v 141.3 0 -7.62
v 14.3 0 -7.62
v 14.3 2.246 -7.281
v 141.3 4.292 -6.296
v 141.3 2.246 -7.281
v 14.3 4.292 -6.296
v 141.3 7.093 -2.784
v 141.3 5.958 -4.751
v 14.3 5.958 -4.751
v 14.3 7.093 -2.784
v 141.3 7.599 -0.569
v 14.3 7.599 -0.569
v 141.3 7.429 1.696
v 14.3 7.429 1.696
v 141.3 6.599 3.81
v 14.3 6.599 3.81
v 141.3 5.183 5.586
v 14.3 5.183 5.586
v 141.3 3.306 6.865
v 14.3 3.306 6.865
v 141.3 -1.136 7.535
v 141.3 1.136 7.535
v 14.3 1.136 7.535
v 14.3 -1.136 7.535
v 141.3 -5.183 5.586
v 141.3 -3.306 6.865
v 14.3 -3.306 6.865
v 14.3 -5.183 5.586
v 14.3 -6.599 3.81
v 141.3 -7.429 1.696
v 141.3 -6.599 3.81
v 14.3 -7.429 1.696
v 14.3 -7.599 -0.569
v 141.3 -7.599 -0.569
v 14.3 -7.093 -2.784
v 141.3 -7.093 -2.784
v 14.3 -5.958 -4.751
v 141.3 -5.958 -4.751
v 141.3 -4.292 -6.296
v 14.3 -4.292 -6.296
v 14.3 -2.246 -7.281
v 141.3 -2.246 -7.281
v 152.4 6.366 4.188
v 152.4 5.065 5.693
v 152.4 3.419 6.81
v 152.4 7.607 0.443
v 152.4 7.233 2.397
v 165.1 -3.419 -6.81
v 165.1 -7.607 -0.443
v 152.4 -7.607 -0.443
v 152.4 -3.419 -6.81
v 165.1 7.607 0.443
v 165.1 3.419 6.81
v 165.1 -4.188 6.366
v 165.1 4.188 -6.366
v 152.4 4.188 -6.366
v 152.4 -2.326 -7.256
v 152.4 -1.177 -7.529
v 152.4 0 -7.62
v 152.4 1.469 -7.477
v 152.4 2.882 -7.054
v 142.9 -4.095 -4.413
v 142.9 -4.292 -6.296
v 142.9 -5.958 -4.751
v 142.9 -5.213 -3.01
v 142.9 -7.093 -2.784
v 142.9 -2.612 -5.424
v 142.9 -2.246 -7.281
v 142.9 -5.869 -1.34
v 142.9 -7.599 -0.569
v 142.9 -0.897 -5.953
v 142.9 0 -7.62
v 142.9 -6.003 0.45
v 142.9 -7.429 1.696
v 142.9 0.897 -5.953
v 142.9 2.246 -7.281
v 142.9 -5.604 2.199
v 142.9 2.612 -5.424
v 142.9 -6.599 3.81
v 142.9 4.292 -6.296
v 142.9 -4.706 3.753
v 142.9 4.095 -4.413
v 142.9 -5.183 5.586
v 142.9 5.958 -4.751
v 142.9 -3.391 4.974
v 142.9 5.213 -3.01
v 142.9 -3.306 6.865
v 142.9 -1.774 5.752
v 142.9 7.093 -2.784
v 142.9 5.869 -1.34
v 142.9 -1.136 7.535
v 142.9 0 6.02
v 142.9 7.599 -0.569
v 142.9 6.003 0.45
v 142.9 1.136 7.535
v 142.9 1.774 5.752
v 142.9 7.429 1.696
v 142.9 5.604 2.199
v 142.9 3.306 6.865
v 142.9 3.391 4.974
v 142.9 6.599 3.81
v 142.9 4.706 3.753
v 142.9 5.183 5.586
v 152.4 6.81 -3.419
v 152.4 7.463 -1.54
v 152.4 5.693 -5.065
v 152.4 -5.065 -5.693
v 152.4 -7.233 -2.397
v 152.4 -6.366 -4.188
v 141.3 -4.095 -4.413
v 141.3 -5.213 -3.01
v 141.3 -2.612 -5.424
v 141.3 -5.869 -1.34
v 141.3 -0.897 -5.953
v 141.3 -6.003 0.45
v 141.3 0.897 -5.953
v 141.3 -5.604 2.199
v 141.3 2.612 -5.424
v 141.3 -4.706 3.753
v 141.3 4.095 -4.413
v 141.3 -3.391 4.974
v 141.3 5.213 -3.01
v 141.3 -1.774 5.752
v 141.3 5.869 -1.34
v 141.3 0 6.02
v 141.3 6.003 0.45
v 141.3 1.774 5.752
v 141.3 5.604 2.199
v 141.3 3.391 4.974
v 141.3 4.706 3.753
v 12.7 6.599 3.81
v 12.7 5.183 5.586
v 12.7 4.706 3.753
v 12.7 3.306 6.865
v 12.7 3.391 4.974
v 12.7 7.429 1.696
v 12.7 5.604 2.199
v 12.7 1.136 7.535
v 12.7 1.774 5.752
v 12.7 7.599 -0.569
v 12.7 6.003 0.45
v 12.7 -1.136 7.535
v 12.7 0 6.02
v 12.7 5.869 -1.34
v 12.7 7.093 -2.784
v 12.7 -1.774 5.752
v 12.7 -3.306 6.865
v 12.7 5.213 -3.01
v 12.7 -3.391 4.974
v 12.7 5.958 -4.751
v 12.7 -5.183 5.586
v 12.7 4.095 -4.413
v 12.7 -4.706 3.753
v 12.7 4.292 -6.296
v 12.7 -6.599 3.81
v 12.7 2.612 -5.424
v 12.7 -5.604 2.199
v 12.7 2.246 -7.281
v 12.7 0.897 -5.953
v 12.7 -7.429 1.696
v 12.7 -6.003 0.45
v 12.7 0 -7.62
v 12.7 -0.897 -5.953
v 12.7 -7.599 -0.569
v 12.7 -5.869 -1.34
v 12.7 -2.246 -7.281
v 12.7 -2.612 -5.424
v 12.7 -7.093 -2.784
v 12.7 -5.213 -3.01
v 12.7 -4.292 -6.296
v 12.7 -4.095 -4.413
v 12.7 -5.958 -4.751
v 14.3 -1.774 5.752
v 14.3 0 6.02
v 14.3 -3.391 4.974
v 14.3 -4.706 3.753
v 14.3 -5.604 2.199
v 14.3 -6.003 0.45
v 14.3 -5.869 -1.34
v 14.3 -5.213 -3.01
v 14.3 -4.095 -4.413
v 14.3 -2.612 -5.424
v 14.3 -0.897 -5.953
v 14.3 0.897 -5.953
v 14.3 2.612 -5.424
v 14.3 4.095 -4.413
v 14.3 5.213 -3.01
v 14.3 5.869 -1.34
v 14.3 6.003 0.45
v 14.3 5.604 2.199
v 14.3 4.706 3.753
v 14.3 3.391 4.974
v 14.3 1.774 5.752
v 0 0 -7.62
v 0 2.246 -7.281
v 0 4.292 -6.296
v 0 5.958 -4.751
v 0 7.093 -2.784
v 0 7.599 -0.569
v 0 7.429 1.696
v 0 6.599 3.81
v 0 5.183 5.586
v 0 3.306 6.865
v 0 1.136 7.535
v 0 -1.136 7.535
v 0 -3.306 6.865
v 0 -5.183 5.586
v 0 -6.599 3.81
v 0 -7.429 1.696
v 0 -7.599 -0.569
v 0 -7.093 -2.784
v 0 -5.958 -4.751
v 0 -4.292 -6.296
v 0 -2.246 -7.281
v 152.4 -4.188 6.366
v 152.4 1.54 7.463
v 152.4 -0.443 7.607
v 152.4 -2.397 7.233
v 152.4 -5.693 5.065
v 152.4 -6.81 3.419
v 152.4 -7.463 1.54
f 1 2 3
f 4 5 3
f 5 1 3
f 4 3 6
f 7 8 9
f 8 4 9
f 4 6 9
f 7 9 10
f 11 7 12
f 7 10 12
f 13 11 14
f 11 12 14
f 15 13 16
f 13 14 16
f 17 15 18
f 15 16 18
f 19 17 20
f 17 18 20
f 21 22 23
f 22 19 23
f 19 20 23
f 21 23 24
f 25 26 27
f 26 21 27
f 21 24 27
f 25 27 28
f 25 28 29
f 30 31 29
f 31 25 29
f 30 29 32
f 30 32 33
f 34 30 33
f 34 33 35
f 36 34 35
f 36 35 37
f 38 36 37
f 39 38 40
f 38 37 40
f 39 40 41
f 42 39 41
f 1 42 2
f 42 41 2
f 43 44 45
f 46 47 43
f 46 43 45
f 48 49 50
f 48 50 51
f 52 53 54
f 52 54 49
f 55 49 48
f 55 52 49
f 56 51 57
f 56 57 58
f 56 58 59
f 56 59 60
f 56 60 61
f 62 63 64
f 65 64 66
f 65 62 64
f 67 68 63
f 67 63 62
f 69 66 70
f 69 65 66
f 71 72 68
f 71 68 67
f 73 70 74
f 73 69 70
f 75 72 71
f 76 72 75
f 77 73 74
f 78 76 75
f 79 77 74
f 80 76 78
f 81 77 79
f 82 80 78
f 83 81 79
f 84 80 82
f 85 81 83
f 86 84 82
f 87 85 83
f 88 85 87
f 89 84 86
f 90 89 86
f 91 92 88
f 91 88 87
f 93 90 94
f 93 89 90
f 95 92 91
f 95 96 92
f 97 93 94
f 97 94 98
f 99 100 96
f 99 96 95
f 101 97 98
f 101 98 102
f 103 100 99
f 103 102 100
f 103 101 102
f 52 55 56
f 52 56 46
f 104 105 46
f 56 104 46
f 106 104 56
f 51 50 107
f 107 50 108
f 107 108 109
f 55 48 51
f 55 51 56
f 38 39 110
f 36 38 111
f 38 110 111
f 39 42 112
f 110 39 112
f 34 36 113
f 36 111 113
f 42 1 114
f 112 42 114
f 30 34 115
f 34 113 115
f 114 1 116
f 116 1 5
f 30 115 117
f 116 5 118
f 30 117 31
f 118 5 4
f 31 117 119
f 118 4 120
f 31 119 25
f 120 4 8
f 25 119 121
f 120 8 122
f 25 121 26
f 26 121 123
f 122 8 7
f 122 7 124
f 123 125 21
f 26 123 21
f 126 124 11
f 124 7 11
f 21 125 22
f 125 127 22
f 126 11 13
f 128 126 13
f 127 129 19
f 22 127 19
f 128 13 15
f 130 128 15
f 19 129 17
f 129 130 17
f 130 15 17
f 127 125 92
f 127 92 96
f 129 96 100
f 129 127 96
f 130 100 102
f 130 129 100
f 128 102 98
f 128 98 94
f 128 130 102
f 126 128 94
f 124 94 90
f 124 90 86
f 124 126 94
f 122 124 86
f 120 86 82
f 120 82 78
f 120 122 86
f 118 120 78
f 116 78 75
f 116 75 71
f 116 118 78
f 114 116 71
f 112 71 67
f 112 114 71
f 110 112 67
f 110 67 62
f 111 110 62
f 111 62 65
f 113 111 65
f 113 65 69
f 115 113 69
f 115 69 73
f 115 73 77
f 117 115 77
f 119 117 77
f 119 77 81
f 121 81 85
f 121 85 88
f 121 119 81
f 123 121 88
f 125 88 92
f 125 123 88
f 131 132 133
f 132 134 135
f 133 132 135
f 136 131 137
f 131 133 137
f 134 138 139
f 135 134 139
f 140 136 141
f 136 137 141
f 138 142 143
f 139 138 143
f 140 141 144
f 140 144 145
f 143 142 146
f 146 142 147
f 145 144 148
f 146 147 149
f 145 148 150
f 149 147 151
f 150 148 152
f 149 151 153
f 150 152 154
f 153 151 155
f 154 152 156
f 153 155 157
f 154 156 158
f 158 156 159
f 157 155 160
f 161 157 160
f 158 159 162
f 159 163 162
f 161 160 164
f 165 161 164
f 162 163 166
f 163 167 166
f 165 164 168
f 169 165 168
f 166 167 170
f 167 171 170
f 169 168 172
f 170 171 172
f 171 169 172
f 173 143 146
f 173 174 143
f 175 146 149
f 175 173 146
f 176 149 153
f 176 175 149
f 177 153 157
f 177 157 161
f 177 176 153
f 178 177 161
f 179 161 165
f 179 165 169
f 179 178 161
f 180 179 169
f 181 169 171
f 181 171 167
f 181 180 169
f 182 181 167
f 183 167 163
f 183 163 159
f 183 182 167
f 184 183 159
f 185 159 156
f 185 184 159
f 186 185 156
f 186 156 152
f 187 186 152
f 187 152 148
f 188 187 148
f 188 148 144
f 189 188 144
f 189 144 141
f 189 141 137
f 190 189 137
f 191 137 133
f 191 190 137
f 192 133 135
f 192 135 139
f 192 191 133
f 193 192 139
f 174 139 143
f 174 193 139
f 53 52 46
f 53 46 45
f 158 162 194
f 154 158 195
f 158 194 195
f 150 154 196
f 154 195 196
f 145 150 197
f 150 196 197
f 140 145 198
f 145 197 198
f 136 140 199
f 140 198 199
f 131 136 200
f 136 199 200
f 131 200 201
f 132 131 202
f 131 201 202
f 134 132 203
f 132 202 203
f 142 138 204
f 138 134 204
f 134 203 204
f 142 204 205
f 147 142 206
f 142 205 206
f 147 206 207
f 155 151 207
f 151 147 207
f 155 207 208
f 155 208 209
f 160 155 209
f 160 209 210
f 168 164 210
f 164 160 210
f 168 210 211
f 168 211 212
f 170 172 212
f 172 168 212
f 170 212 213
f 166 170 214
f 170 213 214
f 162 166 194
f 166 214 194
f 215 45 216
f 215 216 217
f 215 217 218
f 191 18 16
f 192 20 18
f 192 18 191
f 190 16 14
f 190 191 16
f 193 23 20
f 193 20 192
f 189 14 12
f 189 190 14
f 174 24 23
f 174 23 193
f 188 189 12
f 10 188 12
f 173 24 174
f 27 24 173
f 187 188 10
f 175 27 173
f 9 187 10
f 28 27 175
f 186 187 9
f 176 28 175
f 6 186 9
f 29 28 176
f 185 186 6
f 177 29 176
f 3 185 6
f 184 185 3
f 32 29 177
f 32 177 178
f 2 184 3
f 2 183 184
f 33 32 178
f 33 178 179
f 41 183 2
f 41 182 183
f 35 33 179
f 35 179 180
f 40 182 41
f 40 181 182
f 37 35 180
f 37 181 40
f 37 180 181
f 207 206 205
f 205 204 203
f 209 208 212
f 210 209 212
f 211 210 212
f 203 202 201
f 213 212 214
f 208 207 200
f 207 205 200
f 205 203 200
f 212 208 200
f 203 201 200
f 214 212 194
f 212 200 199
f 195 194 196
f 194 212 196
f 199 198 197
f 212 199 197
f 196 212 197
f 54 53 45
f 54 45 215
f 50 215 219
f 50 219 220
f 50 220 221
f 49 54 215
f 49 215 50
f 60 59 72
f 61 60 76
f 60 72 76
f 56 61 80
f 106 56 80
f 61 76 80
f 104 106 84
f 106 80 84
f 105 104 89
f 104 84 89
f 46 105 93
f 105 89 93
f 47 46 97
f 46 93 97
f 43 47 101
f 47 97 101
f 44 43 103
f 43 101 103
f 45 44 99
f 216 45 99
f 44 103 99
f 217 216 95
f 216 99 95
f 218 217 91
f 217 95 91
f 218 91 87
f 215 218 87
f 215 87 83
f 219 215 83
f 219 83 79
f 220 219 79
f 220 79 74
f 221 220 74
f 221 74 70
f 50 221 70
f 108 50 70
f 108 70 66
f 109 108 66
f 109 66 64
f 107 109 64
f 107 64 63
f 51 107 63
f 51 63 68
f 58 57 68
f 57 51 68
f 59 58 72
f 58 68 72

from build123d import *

# Parameters (mm, degrees)
SKETCH2_R           = 7.62
BOSS_EXTRUDE1_DEPTH = 165.1
SKETCH3_W           = 1.6002
SKETCH3_H           = 1.6002
SKETCH4_R           = 7.62
SKETCH4_R_2         = 6.0198
CUT_EXTRUDE1_DEPTH  = 1.6002
SKETCH5_OUTSIDE_W   = 50.54
SKETCH5_OUTSIDE_H   = 50.54
CUT_EXTRUDE2_DEPTH  = 12.7


with BuildPart() as part:
    # Sketch2 → Boss-Extrude1 (new body)
    with BuildSketch(Plane(origin=(0, 0, 0), x_dir=(0, 0, -1), z_dir=(1, 0, 0))):
        Circle(SKETCH2_R)
    extrude(amount=BOSS_EXTRUDE1_DEPTH)

    # Sketch3 → Cut-Revolve1 (revolve, cut)
    with BuildSketch(Plane.XY, mode=Mode.PRIVATE) as cut_revolve1_sk:
        with Locations((13.5001, 6.8199)):
            Rectangle(SKETCH3_W, SKETCH3_H)
    revolve(cut_revolve1_sk.sketch.rotate(Axis((0, 0, 0), (1, 0, 0)), 90), axis=Axis((0, 0, 0), (1, 0, 0)), mode=Mode.SUBTRACT)

    # Sketch4 → Cut-Extrude1 (cut)
    with BuildSketch(Plane.ZY.offset(-141.3002)):
        Circle(SKETCH4_R)
        Circle(SKETCH4_R_2, mode=Mode.SUBTRACT)
    extrude(amount=-CUT_EXTRUDE1_DEPTH, mode=Mode.SUBTRACT)

    # Sketch5 outside → Cut-Extrude2 (cut)
    with BuildSketch(Plane(origin=(165.1, 0, 0), x_dir=(0, 0, -1), z_dir=(1, 0, 0))):
        Rectangle(SKETCH5_OUTSIDE_W, SKETCH5_OUTSIDE_H)
        Polygon((6.366186157, 4.187609558), (-0.44348318, 7.607083716), (-6.809669337, 3.419474158), (-6.366186157, -4.187609558), (0.44348318, -7.607083716), (6.809669337, -3.419474158), align=None, mode=Mode.SUBTRACT)
    extrude(amount=-CUT_EXTRUDE2_DEPTH, mode=Mode.SUBTRACT)


solid = part.part
